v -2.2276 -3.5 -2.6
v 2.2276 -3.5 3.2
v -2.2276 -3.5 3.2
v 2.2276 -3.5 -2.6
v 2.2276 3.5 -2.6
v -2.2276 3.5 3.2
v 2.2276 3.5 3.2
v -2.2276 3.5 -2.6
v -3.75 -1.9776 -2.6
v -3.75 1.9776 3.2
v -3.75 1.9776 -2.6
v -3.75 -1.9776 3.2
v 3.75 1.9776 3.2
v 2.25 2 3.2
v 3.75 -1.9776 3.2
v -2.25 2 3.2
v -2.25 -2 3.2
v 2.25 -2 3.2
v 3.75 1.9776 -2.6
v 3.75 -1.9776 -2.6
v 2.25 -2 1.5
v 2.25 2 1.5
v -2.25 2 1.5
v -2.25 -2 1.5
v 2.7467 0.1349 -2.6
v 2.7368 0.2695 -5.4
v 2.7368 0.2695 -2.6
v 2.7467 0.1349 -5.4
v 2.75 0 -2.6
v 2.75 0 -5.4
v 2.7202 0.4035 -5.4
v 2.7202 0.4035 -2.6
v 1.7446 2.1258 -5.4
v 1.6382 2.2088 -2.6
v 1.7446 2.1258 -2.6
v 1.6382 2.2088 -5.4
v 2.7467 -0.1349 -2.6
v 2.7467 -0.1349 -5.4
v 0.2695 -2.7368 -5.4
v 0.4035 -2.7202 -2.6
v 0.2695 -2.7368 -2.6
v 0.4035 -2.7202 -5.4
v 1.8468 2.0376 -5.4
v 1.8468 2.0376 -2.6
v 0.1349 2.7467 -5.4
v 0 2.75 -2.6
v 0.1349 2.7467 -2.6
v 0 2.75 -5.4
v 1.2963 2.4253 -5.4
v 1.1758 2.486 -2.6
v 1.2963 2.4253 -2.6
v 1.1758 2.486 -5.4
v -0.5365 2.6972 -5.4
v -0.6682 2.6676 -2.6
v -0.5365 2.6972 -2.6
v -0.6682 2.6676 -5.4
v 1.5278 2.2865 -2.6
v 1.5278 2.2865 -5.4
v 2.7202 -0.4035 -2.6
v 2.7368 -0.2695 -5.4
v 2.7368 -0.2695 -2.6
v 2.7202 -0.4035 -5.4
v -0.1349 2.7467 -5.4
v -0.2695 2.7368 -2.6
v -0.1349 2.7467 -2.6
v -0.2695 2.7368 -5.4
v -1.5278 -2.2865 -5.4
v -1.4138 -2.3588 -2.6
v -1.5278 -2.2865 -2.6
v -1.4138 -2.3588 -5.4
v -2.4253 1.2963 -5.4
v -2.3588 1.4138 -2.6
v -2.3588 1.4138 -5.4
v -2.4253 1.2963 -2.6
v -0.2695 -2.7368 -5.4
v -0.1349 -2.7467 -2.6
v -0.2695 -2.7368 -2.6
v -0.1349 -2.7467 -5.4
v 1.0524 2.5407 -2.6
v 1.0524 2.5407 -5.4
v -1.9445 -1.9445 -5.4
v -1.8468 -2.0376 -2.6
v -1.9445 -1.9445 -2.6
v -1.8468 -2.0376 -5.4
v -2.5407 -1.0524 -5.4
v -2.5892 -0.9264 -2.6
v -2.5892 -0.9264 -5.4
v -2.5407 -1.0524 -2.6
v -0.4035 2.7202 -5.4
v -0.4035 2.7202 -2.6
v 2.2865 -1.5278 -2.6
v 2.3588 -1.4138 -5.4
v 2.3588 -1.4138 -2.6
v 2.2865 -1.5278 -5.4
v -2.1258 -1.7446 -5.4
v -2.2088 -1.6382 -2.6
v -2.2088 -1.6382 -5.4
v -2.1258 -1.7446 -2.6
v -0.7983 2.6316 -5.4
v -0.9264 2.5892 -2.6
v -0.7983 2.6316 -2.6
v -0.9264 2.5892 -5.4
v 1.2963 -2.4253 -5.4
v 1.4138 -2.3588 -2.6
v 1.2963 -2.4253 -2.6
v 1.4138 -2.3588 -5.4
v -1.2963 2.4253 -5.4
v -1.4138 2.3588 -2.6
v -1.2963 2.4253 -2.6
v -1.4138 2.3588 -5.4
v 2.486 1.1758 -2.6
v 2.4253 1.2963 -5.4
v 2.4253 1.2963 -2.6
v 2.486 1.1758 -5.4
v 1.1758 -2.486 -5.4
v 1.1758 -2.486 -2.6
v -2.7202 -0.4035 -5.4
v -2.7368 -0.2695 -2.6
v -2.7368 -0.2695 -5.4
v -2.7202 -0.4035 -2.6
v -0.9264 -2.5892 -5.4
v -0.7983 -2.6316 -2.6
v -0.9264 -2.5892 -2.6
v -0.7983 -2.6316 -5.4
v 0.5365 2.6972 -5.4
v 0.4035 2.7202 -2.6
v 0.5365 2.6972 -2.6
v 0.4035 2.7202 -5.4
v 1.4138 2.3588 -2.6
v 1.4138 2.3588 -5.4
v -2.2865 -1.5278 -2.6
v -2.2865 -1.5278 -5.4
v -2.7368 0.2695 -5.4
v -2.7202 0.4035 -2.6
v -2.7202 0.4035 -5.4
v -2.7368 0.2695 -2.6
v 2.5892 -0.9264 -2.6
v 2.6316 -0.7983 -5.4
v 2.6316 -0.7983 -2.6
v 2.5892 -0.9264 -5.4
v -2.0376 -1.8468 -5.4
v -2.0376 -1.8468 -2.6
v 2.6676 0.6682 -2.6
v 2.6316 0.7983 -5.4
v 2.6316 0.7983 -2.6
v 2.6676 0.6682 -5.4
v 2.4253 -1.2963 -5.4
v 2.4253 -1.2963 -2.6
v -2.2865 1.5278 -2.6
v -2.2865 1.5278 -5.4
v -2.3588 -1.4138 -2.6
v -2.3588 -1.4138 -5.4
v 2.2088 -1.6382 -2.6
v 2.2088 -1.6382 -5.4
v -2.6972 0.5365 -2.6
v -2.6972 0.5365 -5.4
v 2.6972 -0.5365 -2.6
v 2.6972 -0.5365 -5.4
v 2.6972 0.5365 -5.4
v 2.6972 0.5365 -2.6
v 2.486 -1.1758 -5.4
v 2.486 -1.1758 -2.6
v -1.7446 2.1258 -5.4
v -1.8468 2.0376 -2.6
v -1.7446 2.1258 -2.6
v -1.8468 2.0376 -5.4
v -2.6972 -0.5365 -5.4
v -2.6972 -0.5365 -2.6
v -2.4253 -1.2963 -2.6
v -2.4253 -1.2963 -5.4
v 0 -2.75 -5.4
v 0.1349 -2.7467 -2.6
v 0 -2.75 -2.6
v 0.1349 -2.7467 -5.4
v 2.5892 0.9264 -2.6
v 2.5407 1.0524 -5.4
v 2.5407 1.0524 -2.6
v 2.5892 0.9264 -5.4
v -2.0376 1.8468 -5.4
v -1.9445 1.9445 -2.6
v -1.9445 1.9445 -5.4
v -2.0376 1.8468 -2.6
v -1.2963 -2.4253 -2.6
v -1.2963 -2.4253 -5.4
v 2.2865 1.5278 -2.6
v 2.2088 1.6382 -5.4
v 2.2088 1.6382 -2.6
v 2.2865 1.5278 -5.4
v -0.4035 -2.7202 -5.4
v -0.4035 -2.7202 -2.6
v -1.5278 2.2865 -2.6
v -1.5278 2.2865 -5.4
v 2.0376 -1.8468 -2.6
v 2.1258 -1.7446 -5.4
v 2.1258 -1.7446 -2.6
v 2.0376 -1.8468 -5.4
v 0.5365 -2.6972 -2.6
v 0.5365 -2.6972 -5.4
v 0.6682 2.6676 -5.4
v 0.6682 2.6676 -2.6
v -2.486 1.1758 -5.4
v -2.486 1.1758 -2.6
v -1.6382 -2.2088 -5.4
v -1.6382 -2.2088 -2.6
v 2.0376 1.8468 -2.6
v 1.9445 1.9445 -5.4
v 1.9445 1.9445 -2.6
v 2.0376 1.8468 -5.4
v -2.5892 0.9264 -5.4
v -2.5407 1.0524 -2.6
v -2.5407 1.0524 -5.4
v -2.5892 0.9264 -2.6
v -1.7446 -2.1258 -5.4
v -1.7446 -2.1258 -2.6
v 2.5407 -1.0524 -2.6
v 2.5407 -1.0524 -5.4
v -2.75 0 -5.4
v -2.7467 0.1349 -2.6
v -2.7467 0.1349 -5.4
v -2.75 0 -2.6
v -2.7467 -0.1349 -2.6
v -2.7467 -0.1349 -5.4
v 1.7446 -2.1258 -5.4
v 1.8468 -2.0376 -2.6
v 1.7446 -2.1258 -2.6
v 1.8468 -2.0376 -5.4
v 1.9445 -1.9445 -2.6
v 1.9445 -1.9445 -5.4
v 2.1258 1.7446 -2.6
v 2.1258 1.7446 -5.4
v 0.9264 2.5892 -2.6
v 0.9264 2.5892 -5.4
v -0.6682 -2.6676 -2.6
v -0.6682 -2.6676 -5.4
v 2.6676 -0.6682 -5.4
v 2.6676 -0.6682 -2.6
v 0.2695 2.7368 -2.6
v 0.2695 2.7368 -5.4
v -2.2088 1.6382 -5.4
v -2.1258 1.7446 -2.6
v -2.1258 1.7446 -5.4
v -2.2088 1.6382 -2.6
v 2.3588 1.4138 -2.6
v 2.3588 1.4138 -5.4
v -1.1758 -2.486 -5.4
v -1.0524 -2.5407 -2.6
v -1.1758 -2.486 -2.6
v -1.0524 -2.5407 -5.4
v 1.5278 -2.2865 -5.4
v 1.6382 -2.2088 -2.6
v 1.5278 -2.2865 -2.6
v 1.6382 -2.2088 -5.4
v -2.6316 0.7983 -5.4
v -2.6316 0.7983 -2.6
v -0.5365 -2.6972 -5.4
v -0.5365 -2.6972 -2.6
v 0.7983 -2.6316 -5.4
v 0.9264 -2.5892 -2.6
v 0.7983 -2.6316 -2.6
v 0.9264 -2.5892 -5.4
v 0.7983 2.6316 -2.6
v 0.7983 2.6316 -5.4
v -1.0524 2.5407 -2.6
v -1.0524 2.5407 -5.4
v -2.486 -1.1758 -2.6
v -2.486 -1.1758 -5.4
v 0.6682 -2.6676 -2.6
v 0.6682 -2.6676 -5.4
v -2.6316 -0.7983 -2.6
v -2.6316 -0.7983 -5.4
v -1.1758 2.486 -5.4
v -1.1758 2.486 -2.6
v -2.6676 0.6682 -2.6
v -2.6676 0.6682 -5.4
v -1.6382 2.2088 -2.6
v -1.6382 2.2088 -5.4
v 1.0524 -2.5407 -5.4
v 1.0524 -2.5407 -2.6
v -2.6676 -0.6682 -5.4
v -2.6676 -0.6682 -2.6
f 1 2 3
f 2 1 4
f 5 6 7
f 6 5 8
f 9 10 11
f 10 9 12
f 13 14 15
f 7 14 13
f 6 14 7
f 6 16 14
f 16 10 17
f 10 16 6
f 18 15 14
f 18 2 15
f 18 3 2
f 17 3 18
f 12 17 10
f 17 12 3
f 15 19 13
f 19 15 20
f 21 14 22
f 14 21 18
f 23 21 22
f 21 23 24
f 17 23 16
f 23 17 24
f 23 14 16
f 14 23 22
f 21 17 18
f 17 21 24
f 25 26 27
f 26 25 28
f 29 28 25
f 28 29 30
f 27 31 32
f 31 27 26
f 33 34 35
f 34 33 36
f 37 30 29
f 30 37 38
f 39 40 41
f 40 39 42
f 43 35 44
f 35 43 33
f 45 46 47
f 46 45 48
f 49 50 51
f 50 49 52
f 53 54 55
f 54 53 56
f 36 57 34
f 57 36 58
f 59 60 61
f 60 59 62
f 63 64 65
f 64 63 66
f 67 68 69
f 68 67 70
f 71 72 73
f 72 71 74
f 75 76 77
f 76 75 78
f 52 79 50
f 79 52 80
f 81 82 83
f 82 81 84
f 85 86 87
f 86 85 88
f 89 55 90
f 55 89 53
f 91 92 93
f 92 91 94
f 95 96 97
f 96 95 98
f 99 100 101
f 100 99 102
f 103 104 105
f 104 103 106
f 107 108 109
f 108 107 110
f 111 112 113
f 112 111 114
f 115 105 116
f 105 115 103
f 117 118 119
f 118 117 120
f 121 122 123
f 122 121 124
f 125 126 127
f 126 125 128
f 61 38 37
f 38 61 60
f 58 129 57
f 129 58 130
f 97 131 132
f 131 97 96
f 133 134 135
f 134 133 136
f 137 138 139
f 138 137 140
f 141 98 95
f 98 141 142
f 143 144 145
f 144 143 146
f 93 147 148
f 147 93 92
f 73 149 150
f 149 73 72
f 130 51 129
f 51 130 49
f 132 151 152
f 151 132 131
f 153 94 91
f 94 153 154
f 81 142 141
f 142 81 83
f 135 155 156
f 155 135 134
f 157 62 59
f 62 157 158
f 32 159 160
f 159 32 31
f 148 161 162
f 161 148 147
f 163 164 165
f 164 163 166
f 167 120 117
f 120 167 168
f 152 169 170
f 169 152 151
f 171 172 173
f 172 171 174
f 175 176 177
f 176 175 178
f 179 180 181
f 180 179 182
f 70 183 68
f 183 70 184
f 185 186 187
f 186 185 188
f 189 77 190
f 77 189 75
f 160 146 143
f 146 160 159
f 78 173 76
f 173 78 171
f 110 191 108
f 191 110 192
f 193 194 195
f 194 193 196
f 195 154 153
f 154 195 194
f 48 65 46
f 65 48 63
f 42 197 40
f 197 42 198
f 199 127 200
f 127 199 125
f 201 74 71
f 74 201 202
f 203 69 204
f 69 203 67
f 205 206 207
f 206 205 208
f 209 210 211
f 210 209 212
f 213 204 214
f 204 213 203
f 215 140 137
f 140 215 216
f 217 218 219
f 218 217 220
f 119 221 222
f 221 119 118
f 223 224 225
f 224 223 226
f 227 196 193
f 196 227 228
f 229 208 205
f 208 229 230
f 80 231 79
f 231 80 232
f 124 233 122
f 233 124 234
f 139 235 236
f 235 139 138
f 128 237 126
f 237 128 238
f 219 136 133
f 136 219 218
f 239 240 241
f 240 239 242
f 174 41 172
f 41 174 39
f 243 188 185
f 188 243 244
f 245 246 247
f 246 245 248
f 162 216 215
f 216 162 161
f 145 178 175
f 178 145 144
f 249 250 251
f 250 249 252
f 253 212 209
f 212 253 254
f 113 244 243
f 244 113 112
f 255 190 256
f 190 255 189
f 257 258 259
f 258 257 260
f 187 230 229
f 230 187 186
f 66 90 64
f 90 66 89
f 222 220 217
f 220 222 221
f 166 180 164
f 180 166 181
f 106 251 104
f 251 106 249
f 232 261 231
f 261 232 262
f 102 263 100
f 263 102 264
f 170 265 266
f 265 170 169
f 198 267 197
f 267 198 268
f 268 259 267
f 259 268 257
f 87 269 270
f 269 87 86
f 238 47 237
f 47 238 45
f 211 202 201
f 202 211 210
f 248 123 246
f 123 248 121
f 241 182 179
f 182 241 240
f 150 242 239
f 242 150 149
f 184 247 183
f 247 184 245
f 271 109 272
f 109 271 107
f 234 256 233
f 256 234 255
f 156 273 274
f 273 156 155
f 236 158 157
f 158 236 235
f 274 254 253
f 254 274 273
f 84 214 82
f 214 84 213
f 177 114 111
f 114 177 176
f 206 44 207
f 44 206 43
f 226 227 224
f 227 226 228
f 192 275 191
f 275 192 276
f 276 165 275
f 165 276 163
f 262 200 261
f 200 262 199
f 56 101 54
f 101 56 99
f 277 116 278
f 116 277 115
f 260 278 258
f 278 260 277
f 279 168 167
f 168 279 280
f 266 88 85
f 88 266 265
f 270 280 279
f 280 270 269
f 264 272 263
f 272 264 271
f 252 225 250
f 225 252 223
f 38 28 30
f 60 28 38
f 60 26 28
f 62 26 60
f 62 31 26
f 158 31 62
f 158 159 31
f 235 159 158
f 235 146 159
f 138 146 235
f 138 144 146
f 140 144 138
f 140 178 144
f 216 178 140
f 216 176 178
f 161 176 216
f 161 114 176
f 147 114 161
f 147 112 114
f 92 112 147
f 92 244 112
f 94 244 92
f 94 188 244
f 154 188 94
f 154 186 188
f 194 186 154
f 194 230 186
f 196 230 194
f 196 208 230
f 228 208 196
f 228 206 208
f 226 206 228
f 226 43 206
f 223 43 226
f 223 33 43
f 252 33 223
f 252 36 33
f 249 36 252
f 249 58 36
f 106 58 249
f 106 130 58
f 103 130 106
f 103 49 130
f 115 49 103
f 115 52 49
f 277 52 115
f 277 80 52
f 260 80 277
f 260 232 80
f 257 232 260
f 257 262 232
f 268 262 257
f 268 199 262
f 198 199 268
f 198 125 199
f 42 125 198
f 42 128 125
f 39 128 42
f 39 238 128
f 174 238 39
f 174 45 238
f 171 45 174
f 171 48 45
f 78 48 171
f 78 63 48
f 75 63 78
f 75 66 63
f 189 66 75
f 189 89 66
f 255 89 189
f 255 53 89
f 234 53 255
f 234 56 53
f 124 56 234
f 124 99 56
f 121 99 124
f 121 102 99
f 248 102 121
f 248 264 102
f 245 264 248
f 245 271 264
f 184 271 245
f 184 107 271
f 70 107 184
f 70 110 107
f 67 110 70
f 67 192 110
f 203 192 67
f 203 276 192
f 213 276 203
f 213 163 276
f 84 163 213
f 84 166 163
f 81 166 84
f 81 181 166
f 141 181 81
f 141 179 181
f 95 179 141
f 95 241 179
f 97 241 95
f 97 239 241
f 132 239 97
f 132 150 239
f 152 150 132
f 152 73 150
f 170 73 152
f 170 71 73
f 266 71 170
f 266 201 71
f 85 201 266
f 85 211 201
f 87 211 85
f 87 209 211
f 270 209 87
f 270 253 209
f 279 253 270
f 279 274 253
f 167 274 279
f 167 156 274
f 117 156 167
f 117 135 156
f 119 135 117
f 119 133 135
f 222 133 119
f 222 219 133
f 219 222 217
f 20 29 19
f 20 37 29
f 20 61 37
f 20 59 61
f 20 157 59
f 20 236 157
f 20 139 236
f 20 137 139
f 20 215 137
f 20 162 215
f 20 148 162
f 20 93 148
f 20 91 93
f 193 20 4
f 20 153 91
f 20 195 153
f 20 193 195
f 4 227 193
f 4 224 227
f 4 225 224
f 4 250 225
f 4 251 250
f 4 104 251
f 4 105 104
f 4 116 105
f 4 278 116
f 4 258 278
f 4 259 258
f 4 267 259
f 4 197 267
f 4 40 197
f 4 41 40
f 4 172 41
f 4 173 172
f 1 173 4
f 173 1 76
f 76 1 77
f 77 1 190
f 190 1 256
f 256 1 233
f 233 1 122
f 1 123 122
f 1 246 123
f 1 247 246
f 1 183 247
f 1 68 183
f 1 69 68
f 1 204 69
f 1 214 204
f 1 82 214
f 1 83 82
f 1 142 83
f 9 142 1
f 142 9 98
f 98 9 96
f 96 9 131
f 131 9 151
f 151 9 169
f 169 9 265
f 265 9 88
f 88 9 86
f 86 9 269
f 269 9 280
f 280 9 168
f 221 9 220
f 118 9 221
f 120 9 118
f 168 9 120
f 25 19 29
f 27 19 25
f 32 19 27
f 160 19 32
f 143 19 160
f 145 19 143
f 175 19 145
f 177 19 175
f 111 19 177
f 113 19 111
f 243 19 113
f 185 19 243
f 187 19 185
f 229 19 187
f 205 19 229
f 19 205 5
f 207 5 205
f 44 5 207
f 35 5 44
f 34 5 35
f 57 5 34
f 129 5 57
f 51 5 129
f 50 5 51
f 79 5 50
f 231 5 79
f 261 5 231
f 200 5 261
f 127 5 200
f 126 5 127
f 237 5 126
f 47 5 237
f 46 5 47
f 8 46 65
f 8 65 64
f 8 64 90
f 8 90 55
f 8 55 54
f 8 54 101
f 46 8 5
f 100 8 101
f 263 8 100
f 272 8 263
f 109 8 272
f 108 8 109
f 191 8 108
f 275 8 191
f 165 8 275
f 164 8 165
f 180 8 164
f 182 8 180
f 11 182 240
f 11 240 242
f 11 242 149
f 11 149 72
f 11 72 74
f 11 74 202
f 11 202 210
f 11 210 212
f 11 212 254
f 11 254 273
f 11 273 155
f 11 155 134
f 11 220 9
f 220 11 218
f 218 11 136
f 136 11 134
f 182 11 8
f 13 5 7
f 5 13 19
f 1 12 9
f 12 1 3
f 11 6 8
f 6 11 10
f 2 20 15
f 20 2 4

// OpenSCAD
EMBOSS_H = 2.8;
TRAVEL_Z = 4.1;

WALL_TH = 1.5;

BTN_W = 4.5;
BTN_H = 4;
BTN_TH = 1.7;

COVER_R = 2.75;

intersection() {
    rotate([0, 0, 45])
        cube([BTN_W * 1.8, BTN_W * 1.8, (EMBOSS_H + TRAVEL_Z) * 3], center=true);
    union() {
        difference() {
            linear_extrude(height=BTN_TH + WALL_TH) offset(r=WALL_TH)
                square([BTN_W, BTN_H], center=true);
            translate([0, 0, BTN_TH / 2 + 1+ WALL_TH]) 
                cube([BTN_W, BTN_H, BTN_TH + 2], center=true); 
        }

        mirror([0, 0, 1]) union() {
            cylinder(h=TRAVEL_Z + EMBOSS_H - WALL_TH, r=COVER_R);
            linear_extrude(height=TRAVEL_Z - WALL_TH) offset(r=WALL_TH)
                square([BTN_W, BTN_H], center=true);
        }
    }
}

$fn = $preview? 20 : 128;
